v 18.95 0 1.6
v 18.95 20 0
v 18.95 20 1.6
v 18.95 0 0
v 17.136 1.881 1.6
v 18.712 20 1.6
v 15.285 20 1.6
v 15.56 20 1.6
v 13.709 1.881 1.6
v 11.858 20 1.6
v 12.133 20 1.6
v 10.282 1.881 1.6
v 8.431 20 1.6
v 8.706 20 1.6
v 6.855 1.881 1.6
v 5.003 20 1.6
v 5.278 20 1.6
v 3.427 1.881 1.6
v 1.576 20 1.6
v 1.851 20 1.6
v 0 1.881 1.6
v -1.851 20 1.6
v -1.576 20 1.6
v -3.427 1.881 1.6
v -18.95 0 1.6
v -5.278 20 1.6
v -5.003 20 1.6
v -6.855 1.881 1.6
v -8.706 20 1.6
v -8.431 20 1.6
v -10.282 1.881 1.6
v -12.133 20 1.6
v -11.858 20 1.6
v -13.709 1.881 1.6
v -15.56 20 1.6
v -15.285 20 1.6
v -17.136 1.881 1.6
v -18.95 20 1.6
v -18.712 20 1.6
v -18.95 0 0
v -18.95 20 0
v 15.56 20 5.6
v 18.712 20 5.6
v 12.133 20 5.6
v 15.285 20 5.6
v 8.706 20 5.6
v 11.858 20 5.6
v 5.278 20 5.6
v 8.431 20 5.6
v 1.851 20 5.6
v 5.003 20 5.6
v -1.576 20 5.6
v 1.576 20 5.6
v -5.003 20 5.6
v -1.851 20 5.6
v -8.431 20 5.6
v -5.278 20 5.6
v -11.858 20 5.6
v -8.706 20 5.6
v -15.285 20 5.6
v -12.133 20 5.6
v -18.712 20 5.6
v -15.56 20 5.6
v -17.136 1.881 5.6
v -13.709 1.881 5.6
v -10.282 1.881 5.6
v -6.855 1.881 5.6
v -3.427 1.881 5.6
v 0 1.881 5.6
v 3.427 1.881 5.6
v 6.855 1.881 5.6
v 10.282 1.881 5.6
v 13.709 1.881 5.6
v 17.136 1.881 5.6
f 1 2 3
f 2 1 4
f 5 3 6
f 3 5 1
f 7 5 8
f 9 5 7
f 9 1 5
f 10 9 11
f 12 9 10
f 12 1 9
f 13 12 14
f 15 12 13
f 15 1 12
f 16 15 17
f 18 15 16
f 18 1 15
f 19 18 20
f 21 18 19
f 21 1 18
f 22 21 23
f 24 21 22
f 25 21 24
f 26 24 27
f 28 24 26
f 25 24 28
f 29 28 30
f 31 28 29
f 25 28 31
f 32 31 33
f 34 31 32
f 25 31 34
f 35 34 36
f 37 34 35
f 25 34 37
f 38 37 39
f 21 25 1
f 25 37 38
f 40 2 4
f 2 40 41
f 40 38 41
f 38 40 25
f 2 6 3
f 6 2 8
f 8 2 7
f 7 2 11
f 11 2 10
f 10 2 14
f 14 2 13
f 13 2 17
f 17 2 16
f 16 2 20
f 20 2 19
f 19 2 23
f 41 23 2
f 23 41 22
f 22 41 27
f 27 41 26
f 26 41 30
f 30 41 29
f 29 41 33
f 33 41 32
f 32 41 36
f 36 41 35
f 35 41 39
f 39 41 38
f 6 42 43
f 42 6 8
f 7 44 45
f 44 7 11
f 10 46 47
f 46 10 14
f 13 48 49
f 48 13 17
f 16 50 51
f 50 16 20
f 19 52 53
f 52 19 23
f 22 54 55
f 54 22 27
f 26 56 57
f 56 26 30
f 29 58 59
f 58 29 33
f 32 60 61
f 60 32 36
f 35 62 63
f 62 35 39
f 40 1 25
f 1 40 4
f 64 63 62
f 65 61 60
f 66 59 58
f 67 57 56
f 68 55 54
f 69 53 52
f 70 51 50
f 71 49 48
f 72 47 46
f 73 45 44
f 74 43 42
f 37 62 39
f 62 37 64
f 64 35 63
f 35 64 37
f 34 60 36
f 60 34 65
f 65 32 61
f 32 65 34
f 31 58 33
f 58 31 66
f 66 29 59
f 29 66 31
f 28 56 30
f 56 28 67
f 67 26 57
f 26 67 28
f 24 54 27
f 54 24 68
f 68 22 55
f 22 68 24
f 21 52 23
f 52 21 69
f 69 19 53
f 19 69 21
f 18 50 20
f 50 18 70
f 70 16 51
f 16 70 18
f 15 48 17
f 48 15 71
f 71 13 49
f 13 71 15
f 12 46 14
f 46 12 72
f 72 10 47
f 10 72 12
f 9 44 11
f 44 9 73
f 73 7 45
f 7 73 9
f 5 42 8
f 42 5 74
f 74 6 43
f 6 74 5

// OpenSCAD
// file: bentobox.layout.scad
// SPDX-FileCopyrightText: 2026 Alon A. Rabinowitz
// SPDX-License-Identifier: CC-BY-NC-SA-4.0
// A remix of BentoBox v2.0 by ThrutheFrame (https://www.printables.com/model/272525), CC BY-NC-SA 4.0.

// What follows from bentobox.params.scad: the section's heights, where every part of the stack stands, and
// the rules as asserts (impossible) and warnings (builds, but compromised).
include <bentobox.params.scad>

eps = 0.01;
bead = fdm_extrusion_w;
perim3 = 3 * fdm_extrusion_w;

// The section, face to face: the grid, the sheet, the air above it. Its tongue stands above that.
sec_h = grid_t + sheet_t + plenum_h;
ledge_w = ledge_beads * bead;
rib_w = grid_beads * bead;

// The stack, bottom up: the Z of each part's bottom face, with the section or without.
function stack(with_section) = let(
    fans_z = duct_h,
    sec_z = fans_z + fans_h,
    carbon_z = sec_z + (with_section ? sec_h : 0),
    hepa_z = carbon_z + carbon_h
) [fans_z, sec_z, carbon_z, hepa_z, hepa_z + hepa_h + cover_top];
// [fan case, section, carbon housing, HEPA holder, the cover's top]

// The C-MAG's three trays, standing: each tray's pellets fall onto the grill below them and spread over the
// whole of the C-MAG's inside. Lying open, a tray between two grills is (spacing - grill) long and the
// inside's W - 4 wide; standing, the same pellets cover (W - 4) x (T - 4). The ribs that hold the grills,
// and the corners' fillets, take about 4 % of a tray either way, and cancel to well under 0.1 mm.
cmag_in = [cmag[1] - 4, cmag[2] - 4];                          // W x T inside its walls
cmag_tray = cmag_grills[1] - cmag_grills[0] - cmag_grill_t;    // a tray's length between two grills
cmag_layer = cmag_tray * cmag_fill / cmag_in[1];               // its pellets' depth, standing
cmag_z0 = carbon_floor;                                         // the C-MAG's bottom, on the housing's floor
// Each layer's bottom: the top face of the grill under it, from the C-MAG's bottom.
cmag_layers = [for (i = [0 : 2]) cmag_grills[i] + cmag_grill_t / 2];

// The frame for your own HEPA paper. The ring stands on the HEPA holder's ledge, in its pocket; the paper
// fills it with its folds along Y, and a cap closes each end. The piece's two long edges are cut along a
// top fold, so it holds a whole number of pleats across: as many as come nearest the ring's inside,
// stretched or squeezed to fill it, as a pleated pack will - and the caps' wedges are spaced to match.
ring_wall = ring_beads * bead;
ring_out = [in_w - 2 * ring_play, hepa_pocket_l - 2 * ring_play];   // X, Y
ring_in = ring_out - 2 * [ring_wall, ring_wall];
ring_h = paper_depth;
pack_n = max(1, round(ring_in[0] / paper_pitch));   // pleats across: the channels open at the top
pack_pitch = ring_in[0] / pack_n;
pack_l = ring_in[1] - 2 * cap_plate;                 // the piece's length, along the folds
// Seen along the folds, the paper's middle runs from a top fold paper_t / 2 under the pack's top face to a
// bottom fold paper_t / 2 over its bottom, leaning pleat_alpha from upright. A channel open at the top is
// what lies inside the paper's faces, between two top folds: its sides are those middles moved
// paper_t / (2 cos(alpha)) sideways, so its bottom is paper_t / (2 sin(alpha)) above the bottom fold's middle
// - in a narrow pleat, millimetres, not the paper's thickness. Each wedge is that channel's shape.
pleat_alpha = atan((pack_pitch / 2) / (paper_depth - paper_t));
wedge_w = 2 * ((paper_depth - paper_t / 2) * tan(pleat_alpha) - paper_t / (2 * cos(pleat_alpha)));   // at the top face
wedge_z0 = paper_t / 2 + paper_t / (2 * sin(pleat_alpha));    // its point, above the pack's bottom face

assert(wedge_w > 0, "the pleats are too narrow for the paper's thickness: no channel is left to close");
assert(pack_l > 2 * cap_wedge_l + 10, "the ring is too short for its caps' wedges");
assert(hepa_ledge + ring_h < hepa_h - 1, "the paper is deeper than the HEPA holder is tall");

assert(grid_t >= groove_h + 2 * fdm_layer_h, "the grid's rim must roof the groove in the section's bottom");
assert(ledge_w > -groove_in, "the ledge must reach past the groove's inner face");
assert(cmag[0] < carbon_h - carbon_floor, "the C-MAG must stand inside the carbon housing");

// Wall between a magnet's hole and the joint's tongue or groove, whichever reaches further out. The originals
// have the same holes at the same places: 1.0 mm, so the section has what every BentoBox part has.
mag_to_inside = norm([mag_xy[0] - (in_w / 2 - in_r), mag_xy[1] - (in_l / 2 - in_r)]) - in_r;
mag_wall = mag_to_inside - mag_d / 2 - max(tongue_base, groove_out);
assert(mag_wall > 2 * bead, "a magnet's hole must not break into the joint's groove");

warns = [
    if (ledge_w + groove_in < 2 * bead - 1e-9) str("the groove's inner wall is ", ledge_w + groove_in, " mm, under two beads"),
    if (plenum_h < 3) str("only ", plenum_h, " mm of air above the sheet: the openings above will load it unevenly"),
    if (abs(pack_pitch / paper_pitch - 1) > 0.1)
        str("the paper is ", pack_pitch > paper_pitch ? "stretched" : "squeezed", " ", round(100 * abs(pack_pitch / paper_pitch - 1)),
            " % to fill the ring: ", pack_n, " pleats in ", ring_in[0], " mm"),
    if (wedge_w < 2 * bead - 1e-9) str("the caps' wedges are ", wedge_w, " mm wide at the top, under two beads: they may not print"),
];
for (w = warns) echo(str("WARNING: ", w));
// main file
// SPDX-FileCopyrightText: 2026 Alon A. Rabinowitz
// SPDX-License-Identifier: CC-BY-NC-SA-4.0
// A remix of BentoBox v2.0 by ThrutheFrame (https://www.printables.com/model/272525), CC BY-NC-SA 4.0.

// A cap for the ends of your own HEPA paper, in TPU - two to a ring - on its own: everything is in
// bentobox.scad, and this file only pins the part. Other paper: change paper_depth, paper_pitch and paper_t
// in bentobox.params.scad.
include <bentobox.scad>
part = "hepa_cap";
